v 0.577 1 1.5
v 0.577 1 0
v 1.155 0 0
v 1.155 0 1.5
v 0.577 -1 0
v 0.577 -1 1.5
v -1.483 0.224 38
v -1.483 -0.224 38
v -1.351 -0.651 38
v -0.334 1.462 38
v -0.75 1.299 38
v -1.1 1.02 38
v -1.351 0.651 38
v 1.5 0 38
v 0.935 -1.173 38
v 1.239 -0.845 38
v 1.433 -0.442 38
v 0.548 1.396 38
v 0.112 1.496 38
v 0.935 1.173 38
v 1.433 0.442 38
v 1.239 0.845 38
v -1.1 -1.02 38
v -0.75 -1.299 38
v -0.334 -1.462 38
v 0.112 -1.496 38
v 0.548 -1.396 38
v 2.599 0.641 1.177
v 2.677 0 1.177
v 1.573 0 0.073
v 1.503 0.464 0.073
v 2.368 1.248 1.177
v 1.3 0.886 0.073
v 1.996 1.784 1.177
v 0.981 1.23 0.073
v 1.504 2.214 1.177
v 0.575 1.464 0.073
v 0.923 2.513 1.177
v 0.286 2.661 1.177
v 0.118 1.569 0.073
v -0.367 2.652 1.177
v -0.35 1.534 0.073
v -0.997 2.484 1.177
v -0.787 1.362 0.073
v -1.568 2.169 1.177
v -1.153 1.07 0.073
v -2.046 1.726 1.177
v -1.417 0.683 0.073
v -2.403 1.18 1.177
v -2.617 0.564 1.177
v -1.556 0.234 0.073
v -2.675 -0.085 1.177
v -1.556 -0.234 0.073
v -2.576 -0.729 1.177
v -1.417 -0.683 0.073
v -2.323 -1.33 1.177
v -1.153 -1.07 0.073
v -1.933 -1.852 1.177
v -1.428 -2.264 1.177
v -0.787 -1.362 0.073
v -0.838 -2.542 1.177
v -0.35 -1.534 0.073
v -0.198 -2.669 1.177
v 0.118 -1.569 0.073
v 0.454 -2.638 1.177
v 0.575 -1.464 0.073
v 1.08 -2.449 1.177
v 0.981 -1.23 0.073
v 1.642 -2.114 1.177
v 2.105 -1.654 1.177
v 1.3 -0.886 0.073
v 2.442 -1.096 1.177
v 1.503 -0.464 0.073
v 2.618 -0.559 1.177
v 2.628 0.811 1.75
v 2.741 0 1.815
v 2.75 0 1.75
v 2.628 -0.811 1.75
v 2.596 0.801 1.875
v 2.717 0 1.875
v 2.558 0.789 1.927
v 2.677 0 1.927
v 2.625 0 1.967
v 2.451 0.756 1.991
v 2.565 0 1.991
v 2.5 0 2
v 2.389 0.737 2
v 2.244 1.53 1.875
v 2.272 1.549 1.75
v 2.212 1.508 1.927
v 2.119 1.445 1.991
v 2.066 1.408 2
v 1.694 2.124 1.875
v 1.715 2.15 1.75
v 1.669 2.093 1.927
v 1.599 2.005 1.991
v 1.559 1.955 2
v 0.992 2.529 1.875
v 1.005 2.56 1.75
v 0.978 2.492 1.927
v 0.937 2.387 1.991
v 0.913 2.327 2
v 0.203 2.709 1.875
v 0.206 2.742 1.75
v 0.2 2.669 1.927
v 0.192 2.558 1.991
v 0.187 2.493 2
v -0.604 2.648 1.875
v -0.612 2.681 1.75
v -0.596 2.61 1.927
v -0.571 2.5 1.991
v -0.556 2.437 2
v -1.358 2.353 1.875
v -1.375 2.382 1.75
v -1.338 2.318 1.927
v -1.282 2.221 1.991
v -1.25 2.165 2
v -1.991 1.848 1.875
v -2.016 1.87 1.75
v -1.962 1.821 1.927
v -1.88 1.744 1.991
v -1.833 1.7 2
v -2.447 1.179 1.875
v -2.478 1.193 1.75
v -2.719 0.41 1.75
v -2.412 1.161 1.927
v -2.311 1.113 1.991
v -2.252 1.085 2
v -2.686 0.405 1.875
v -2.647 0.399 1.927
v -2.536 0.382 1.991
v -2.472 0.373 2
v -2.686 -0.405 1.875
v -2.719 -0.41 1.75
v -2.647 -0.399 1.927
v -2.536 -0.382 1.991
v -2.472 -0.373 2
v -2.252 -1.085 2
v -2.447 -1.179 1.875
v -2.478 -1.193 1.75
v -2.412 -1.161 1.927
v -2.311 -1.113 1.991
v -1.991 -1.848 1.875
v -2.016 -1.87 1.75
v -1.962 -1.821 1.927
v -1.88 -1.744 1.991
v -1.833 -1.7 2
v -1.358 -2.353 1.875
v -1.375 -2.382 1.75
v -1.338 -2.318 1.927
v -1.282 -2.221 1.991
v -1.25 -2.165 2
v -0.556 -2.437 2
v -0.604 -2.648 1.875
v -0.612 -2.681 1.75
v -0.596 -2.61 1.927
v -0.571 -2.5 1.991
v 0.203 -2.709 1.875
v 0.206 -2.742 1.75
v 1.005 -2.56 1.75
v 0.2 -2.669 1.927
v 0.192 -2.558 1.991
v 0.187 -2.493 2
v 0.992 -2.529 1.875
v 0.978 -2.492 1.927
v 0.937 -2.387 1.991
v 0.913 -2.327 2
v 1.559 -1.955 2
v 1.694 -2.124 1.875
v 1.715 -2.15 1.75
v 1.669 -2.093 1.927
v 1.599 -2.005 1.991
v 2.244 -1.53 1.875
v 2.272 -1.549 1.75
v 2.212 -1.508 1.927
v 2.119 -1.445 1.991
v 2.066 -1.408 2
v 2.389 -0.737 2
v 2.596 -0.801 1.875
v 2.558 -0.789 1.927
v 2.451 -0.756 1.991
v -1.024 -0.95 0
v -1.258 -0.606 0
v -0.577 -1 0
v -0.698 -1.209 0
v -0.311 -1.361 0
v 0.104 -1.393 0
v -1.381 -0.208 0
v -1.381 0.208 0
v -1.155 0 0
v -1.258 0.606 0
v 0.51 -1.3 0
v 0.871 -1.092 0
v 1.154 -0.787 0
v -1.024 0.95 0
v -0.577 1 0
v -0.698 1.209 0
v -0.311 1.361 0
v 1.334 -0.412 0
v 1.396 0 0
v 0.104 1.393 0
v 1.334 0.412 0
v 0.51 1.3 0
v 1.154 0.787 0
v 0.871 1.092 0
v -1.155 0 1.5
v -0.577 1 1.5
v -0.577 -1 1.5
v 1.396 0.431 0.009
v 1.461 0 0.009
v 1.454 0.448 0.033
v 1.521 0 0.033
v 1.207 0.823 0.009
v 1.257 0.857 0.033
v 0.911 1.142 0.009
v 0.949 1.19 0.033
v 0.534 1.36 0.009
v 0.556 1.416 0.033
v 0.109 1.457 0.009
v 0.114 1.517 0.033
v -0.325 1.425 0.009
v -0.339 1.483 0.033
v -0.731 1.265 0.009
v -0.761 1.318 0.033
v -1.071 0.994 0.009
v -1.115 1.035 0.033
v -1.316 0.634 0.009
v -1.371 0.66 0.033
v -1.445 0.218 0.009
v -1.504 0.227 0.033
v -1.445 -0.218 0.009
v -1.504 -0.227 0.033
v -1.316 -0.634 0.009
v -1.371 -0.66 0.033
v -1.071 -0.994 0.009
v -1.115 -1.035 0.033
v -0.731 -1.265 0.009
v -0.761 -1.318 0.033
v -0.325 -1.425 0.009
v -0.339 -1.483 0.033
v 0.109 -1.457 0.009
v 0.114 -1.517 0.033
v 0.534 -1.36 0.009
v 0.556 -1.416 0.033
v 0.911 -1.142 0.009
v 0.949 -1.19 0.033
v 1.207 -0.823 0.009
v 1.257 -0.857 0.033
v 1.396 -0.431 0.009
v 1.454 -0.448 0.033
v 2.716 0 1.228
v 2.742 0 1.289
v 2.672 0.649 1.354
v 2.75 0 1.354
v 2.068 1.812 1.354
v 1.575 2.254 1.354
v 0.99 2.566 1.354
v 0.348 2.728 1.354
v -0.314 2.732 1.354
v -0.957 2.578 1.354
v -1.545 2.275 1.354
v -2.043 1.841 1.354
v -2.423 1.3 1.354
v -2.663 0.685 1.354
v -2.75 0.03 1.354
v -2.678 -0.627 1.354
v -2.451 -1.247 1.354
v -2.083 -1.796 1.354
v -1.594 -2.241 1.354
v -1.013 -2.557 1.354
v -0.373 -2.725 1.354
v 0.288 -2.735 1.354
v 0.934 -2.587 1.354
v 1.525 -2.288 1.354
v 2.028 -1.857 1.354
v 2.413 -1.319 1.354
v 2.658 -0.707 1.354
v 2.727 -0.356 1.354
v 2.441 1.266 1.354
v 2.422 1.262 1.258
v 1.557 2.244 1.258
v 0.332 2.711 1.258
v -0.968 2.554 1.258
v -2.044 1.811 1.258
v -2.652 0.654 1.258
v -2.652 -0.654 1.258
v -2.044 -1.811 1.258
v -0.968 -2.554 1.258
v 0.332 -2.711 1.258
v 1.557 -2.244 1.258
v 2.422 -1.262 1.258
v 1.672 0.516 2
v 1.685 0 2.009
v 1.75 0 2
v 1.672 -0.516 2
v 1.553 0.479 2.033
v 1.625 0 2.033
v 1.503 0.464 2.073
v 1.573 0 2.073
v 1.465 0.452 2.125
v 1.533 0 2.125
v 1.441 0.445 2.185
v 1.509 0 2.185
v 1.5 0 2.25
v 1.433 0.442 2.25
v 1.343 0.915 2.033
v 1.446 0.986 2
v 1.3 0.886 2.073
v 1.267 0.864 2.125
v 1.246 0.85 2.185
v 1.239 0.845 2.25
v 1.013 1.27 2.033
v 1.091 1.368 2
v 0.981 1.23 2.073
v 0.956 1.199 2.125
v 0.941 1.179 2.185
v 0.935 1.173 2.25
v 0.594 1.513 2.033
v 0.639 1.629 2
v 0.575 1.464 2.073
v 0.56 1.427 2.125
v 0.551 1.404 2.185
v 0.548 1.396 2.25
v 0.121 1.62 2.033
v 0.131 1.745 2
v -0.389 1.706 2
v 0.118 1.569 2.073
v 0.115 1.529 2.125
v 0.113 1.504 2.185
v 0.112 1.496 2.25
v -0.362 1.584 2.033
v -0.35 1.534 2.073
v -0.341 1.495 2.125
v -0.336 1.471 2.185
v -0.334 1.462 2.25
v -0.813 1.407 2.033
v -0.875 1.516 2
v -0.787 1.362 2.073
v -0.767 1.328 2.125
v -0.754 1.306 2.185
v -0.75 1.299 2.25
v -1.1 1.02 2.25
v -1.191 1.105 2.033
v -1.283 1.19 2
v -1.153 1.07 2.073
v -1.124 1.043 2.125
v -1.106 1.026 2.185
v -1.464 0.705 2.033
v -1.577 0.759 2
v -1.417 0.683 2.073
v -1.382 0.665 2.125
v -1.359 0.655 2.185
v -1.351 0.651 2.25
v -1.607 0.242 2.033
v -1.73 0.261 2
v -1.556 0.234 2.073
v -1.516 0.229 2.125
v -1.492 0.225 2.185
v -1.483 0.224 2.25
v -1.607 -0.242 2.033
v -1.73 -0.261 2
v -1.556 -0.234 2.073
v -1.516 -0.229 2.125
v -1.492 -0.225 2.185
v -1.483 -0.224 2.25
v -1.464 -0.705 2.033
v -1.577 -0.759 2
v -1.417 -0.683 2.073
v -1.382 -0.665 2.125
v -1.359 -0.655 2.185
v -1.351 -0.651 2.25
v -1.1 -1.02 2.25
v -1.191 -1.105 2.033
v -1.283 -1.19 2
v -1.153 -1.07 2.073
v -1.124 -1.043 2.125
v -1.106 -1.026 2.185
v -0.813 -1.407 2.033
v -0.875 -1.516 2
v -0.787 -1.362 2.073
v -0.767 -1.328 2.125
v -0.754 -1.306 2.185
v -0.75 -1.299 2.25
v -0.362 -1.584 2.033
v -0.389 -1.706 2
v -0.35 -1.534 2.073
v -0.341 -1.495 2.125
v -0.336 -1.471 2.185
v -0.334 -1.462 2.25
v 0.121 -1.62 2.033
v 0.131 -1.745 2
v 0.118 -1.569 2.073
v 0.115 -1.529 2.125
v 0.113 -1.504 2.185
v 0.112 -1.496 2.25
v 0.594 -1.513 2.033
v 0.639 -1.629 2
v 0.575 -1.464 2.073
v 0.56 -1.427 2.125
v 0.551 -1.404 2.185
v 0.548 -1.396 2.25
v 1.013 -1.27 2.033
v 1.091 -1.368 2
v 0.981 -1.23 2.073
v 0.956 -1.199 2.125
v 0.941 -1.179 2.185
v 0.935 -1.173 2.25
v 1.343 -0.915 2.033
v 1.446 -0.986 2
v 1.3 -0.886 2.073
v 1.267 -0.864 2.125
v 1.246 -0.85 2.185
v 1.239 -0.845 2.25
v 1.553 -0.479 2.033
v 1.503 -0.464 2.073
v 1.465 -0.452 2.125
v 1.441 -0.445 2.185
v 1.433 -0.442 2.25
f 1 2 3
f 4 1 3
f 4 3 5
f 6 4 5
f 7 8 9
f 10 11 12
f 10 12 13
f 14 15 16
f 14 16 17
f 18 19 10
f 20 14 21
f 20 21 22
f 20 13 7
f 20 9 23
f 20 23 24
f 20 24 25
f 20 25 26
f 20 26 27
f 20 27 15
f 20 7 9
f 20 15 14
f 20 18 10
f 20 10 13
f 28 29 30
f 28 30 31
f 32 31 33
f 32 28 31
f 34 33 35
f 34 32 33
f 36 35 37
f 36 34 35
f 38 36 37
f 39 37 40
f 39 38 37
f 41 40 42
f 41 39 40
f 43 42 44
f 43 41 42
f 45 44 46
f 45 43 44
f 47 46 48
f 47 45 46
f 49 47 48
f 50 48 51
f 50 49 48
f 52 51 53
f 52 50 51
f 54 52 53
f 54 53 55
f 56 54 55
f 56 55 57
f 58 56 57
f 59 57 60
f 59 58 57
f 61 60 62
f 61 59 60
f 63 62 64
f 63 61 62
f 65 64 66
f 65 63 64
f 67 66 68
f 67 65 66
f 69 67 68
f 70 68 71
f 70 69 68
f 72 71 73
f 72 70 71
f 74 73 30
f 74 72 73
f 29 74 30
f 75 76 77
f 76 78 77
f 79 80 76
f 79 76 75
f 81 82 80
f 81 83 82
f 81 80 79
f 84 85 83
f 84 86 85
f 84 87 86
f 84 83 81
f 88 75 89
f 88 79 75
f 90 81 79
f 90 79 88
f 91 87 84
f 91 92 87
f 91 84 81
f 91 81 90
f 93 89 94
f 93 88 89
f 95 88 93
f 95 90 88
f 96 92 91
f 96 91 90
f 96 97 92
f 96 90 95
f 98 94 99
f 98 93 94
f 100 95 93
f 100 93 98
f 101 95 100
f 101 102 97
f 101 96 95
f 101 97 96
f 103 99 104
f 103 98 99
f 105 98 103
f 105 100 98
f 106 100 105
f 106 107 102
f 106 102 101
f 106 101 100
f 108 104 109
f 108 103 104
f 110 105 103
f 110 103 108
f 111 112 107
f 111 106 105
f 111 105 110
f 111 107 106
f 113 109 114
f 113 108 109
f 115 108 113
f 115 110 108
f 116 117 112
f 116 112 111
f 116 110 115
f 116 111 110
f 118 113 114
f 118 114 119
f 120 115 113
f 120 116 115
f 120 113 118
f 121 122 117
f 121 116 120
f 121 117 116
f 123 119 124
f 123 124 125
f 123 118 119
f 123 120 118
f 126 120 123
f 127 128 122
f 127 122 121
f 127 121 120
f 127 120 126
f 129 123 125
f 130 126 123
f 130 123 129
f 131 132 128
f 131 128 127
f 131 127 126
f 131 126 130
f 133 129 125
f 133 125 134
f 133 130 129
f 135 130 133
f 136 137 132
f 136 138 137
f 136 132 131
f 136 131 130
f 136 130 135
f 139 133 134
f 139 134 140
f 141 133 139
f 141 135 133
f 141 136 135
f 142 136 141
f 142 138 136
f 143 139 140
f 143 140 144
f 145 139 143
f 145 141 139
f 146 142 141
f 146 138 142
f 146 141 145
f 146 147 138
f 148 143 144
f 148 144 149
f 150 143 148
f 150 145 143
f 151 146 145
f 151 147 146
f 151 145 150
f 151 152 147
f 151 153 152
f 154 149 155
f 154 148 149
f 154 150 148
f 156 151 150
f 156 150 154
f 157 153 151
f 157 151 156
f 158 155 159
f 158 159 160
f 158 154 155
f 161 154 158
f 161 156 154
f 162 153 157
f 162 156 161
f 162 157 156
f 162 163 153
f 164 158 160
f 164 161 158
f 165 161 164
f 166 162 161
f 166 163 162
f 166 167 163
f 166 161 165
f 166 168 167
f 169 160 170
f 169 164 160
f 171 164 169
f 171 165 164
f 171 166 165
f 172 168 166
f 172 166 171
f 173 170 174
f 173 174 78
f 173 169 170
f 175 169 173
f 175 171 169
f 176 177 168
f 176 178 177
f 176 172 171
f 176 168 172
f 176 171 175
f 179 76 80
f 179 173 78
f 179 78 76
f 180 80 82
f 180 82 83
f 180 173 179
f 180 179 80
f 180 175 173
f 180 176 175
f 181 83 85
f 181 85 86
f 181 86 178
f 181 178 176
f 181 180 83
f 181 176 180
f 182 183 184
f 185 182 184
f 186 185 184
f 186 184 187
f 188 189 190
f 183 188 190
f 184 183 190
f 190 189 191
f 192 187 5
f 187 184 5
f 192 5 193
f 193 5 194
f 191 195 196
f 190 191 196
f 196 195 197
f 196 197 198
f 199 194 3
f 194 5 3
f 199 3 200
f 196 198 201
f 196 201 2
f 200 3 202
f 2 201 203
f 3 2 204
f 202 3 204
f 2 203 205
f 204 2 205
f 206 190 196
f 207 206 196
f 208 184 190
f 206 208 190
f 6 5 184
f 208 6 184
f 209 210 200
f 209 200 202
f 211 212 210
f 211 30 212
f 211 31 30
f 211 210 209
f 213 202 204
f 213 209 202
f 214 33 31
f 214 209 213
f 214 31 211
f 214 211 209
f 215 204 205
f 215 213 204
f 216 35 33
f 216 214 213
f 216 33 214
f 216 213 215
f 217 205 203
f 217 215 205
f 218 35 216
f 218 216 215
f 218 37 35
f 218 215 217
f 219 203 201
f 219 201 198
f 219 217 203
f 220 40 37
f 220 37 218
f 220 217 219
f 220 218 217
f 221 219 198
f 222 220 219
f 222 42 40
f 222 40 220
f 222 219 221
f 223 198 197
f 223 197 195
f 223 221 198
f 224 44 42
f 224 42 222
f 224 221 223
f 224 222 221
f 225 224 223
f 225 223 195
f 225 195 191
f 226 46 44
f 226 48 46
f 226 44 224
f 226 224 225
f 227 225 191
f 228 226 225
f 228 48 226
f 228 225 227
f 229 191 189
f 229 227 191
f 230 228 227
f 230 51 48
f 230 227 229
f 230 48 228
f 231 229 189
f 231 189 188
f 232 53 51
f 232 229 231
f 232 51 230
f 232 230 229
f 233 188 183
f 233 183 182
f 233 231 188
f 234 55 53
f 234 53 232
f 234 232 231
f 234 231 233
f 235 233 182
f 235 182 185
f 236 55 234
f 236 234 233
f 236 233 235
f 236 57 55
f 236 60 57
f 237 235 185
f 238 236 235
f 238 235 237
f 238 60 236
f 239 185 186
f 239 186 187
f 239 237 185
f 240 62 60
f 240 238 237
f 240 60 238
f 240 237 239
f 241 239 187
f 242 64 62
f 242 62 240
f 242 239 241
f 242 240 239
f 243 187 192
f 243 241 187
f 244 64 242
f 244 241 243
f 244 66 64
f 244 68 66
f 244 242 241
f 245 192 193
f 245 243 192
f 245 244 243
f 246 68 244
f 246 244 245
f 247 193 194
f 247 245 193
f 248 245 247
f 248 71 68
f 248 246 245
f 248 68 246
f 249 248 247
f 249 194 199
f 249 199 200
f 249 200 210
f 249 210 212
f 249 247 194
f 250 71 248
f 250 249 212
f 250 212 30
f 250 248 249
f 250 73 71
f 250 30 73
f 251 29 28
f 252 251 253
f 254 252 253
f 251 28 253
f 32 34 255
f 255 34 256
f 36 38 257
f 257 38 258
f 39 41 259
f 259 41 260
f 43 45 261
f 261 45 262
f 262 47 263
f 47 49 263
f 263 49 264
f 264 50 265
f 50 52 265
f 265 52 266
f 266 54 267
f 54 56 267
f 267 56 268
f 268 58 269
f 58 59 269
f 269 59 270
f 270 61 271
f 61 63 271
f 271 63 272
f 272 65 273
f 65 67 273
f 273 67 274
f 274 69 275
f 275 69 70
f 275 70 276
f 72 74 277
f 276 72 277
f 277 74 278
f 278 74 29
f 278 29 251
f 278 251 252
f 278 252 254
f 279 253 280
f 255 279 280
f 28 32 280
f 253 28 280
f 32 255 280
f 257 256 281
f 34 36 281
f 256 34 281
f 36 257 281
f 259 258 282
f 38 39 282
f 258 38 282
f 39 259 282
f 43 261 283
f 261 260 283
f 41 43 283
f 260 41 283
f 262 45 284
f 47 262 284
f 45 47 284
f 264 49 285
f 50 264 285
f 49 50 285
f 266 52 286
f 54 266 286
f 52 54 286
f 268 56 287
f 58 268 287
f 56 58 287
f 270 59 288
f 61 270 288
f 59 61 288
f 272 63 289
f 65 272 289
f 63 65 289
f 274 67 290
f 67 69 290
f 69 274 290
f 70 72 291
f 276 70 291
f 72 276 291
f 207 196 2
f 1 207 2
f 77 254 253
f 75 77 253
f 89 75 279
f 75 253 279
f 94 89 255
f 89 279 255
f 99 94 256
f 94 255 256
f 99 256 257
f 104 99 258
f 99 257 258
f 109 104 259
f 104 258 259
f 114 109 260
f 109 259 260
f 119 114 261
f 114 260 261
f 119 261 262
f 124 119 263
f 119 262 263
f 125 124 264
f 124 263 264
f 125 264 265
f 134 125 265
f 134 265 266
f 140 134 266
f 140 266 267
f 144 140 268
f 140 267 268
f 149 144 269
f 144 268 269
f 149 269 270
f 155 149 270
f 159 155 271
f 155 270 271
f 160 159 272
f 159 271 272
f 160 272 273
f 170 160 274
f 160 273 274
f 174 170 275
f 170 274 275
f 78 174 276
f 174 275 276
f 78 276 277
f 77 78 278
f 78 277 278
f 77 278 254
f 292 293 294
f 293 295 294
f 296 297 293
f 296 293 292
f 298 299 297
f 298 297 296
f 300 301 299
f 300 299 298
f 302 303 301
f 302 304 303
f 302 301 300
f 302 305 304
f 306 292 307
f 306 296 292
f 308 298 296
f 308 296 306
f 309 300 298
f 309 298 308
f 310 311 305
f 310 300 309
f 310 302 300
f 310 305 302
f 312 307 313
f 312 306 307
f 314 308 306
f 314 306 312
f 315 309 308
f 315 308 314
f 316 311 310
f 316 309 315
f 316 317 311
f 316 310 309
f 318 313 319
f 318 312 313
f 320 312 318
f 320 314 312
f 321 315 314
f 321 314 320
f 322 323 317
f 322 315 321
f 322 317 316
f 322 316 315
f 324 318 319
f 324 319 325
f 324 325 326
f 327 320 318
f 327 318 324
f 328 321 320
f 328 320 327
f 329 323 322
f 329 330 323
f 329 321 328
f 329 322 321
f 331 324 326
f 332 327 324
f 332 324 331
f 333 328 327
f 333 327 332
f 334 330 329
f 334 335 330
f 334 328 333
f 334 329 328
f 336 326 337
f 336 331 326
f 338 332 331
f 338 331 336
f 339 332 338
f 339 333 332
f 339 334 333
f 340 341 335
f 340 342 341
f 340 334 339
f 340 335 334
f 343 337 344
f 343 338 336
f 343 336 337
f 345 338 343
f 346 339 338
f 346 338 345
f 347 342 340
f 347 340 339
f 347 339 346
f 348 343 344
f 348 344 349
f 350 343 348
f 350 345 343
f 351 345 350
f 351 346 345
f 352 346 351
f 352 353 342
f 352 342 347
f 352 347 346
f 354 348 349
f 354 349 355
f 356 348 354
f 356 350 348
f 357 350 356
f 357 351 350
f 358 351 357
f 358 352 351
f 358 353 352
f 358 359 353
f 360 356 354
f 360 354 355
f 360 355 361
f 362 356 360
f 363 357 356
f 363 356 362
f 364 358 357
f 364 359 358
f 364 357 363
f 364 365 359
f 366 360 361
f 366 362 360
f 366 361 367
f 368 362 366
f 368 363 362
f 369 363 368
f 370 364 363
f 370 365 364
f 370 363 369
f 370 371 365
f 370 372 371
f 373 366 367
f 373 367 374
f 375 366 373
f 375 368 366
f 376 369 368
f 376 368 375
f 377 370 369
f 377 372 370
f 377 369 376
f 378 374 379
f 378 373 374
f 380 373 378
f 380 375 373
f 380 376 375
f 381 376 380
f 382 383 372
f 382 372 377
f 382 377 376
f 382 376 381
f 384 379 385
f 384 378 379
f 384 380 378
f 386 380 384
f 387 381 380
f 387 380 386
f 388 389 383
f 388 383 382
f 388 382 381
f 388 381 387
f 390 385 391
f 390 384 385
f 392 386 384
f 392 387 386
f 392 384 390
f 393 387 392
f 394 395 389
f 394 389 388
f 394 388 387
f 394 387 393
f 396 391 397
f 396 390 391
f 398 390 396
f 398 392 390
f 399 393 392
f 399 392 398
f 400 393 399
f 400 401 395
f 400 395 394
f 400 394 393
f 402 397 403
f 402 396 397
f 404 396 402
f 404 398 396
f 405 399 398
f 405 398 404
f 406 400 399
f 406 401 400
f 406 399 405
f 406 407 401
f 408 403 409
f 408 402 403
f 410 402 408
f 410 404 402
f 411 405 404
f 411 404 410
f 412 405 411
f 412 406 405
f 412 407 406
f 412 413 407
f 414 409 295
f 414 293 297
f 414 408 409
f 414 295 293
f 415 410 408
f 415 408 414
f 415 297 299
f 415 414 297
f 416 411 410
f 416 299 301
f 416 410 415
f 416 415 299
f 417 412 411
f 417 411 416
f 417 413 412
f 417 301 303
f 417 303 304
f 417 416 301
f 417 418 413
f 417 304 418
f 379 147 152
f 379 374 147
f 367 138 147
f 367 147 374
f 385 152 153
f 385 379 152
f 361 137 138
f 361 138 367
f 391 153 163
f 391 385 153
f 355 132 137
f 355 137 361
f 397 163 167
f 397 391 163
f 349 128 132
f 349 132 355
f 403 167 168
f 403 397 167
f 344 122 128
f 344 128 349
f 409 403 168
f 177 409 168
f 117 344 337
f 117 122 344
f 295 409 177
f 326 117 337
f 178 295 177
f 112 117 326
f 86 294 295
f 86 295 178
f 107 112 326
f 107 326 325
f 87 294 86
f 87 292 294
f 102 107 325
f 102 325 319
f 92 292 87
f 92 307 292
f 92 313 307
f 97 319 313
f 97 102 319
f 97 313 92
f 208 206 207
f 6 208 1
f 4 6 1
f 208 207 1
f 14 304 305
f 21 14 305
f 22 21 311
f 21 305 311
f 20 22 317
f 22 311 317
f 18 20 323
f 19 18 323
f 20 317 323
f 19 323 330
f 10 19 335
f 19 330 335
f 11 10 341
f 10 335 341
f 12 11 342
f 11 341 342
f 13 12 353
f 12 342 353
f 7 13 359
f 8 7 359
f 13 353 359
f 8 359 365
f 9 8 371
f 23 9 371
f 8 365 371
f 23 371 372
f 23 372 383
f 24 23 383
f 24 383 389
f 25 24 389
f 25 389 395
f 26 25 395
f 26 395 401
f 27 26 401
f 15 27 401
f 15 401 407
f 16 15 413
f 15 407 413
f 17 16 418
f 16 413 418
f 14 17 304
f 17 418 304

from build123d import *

# Parameters (mm, degrees)
F1_R     = 2.75
F1_R_2   = 1.5
F2_DEPTH = 2
F3_START = 1.5
F3_DEPTH = 0.5
F4_START = 2
F4_DEPTH = 36
F5_SIZE2 = 1.25
F5_SIZE  = 1.25
F6_R     = 0.25


# Not quite as in the source:
# - a feature names something its author has since deleted; it is built from what else it names


with BuildPart() as f2:
    # F1 (on Top) → F2 (new body)
    with BuildSketch(Plane.XY):
        Circle(F1_R)
        Circle(F1_R_2, mode=Mode.SUBTRACT)
        Circle(F1_R_2)
        Polygon((-0.5773502692, -1), (-1.1547005384, 0), (-0.5773502692, 1), (0.5773502692, 1), (1.1547005384, 0), (0.5773502692, -1), align=None, mode=Mode.SUBTRACT)
    extrude(amount=F2_DEPTH)

    # F1 (on Top) → F3 (join)
    with BuildSketch(Plane.XY.offset(F3_START)):
        Polygon((-0.5773502692, 1), (-1.1547005384, 0), (-0.5773502692, -1), (0.5773502692, -1), (1.1547005384, 0), (0.5773502692, 1), align=None)
    extrude(amount=F3_DEPTH)

    # F1 (on Top) → F4 (join)
    with BuildSketch(Plane.XY.offset(F4_START)):
        Circle(F1_R_2)
        Polygon((-0.5773502692, -1), (-1.1547005384, 0), (-0.5773502692, 1), (0.5773502692, 1), (1.1547005384, 0), (0.5773502692, -1), align=None, mode=Mode.SUBTRACT)
        Polygon((-0.5773502692, 1), (-1.1547005384, 0), (-0.5773502692, -1), (0.5773502692, -1), (1.1547005384, 0), (0.5773502692, 1), align=None)
    extrude(amount=F4_DEPTH)

    # F5
    f5_edges = [f2.edges().sort_by_distance(p)[0] for p in [
        (-2.75, 0, 0),
    ]]
    chamfer(f5_edges, length=F5_SIZE, length2=F5_SIZE2)

    # F6
    f6_edges = [f2.edges().sort_by_distance(p)[0] for p in [
        (-2.75, 0, 2),
        (-1.5, 0, 2),
        (-1.5, 0, 0),
        (-2.75, 0, 1.25),
    ]]
    fillet(f6_edges, radius=F6_R)


solid = f2.part
